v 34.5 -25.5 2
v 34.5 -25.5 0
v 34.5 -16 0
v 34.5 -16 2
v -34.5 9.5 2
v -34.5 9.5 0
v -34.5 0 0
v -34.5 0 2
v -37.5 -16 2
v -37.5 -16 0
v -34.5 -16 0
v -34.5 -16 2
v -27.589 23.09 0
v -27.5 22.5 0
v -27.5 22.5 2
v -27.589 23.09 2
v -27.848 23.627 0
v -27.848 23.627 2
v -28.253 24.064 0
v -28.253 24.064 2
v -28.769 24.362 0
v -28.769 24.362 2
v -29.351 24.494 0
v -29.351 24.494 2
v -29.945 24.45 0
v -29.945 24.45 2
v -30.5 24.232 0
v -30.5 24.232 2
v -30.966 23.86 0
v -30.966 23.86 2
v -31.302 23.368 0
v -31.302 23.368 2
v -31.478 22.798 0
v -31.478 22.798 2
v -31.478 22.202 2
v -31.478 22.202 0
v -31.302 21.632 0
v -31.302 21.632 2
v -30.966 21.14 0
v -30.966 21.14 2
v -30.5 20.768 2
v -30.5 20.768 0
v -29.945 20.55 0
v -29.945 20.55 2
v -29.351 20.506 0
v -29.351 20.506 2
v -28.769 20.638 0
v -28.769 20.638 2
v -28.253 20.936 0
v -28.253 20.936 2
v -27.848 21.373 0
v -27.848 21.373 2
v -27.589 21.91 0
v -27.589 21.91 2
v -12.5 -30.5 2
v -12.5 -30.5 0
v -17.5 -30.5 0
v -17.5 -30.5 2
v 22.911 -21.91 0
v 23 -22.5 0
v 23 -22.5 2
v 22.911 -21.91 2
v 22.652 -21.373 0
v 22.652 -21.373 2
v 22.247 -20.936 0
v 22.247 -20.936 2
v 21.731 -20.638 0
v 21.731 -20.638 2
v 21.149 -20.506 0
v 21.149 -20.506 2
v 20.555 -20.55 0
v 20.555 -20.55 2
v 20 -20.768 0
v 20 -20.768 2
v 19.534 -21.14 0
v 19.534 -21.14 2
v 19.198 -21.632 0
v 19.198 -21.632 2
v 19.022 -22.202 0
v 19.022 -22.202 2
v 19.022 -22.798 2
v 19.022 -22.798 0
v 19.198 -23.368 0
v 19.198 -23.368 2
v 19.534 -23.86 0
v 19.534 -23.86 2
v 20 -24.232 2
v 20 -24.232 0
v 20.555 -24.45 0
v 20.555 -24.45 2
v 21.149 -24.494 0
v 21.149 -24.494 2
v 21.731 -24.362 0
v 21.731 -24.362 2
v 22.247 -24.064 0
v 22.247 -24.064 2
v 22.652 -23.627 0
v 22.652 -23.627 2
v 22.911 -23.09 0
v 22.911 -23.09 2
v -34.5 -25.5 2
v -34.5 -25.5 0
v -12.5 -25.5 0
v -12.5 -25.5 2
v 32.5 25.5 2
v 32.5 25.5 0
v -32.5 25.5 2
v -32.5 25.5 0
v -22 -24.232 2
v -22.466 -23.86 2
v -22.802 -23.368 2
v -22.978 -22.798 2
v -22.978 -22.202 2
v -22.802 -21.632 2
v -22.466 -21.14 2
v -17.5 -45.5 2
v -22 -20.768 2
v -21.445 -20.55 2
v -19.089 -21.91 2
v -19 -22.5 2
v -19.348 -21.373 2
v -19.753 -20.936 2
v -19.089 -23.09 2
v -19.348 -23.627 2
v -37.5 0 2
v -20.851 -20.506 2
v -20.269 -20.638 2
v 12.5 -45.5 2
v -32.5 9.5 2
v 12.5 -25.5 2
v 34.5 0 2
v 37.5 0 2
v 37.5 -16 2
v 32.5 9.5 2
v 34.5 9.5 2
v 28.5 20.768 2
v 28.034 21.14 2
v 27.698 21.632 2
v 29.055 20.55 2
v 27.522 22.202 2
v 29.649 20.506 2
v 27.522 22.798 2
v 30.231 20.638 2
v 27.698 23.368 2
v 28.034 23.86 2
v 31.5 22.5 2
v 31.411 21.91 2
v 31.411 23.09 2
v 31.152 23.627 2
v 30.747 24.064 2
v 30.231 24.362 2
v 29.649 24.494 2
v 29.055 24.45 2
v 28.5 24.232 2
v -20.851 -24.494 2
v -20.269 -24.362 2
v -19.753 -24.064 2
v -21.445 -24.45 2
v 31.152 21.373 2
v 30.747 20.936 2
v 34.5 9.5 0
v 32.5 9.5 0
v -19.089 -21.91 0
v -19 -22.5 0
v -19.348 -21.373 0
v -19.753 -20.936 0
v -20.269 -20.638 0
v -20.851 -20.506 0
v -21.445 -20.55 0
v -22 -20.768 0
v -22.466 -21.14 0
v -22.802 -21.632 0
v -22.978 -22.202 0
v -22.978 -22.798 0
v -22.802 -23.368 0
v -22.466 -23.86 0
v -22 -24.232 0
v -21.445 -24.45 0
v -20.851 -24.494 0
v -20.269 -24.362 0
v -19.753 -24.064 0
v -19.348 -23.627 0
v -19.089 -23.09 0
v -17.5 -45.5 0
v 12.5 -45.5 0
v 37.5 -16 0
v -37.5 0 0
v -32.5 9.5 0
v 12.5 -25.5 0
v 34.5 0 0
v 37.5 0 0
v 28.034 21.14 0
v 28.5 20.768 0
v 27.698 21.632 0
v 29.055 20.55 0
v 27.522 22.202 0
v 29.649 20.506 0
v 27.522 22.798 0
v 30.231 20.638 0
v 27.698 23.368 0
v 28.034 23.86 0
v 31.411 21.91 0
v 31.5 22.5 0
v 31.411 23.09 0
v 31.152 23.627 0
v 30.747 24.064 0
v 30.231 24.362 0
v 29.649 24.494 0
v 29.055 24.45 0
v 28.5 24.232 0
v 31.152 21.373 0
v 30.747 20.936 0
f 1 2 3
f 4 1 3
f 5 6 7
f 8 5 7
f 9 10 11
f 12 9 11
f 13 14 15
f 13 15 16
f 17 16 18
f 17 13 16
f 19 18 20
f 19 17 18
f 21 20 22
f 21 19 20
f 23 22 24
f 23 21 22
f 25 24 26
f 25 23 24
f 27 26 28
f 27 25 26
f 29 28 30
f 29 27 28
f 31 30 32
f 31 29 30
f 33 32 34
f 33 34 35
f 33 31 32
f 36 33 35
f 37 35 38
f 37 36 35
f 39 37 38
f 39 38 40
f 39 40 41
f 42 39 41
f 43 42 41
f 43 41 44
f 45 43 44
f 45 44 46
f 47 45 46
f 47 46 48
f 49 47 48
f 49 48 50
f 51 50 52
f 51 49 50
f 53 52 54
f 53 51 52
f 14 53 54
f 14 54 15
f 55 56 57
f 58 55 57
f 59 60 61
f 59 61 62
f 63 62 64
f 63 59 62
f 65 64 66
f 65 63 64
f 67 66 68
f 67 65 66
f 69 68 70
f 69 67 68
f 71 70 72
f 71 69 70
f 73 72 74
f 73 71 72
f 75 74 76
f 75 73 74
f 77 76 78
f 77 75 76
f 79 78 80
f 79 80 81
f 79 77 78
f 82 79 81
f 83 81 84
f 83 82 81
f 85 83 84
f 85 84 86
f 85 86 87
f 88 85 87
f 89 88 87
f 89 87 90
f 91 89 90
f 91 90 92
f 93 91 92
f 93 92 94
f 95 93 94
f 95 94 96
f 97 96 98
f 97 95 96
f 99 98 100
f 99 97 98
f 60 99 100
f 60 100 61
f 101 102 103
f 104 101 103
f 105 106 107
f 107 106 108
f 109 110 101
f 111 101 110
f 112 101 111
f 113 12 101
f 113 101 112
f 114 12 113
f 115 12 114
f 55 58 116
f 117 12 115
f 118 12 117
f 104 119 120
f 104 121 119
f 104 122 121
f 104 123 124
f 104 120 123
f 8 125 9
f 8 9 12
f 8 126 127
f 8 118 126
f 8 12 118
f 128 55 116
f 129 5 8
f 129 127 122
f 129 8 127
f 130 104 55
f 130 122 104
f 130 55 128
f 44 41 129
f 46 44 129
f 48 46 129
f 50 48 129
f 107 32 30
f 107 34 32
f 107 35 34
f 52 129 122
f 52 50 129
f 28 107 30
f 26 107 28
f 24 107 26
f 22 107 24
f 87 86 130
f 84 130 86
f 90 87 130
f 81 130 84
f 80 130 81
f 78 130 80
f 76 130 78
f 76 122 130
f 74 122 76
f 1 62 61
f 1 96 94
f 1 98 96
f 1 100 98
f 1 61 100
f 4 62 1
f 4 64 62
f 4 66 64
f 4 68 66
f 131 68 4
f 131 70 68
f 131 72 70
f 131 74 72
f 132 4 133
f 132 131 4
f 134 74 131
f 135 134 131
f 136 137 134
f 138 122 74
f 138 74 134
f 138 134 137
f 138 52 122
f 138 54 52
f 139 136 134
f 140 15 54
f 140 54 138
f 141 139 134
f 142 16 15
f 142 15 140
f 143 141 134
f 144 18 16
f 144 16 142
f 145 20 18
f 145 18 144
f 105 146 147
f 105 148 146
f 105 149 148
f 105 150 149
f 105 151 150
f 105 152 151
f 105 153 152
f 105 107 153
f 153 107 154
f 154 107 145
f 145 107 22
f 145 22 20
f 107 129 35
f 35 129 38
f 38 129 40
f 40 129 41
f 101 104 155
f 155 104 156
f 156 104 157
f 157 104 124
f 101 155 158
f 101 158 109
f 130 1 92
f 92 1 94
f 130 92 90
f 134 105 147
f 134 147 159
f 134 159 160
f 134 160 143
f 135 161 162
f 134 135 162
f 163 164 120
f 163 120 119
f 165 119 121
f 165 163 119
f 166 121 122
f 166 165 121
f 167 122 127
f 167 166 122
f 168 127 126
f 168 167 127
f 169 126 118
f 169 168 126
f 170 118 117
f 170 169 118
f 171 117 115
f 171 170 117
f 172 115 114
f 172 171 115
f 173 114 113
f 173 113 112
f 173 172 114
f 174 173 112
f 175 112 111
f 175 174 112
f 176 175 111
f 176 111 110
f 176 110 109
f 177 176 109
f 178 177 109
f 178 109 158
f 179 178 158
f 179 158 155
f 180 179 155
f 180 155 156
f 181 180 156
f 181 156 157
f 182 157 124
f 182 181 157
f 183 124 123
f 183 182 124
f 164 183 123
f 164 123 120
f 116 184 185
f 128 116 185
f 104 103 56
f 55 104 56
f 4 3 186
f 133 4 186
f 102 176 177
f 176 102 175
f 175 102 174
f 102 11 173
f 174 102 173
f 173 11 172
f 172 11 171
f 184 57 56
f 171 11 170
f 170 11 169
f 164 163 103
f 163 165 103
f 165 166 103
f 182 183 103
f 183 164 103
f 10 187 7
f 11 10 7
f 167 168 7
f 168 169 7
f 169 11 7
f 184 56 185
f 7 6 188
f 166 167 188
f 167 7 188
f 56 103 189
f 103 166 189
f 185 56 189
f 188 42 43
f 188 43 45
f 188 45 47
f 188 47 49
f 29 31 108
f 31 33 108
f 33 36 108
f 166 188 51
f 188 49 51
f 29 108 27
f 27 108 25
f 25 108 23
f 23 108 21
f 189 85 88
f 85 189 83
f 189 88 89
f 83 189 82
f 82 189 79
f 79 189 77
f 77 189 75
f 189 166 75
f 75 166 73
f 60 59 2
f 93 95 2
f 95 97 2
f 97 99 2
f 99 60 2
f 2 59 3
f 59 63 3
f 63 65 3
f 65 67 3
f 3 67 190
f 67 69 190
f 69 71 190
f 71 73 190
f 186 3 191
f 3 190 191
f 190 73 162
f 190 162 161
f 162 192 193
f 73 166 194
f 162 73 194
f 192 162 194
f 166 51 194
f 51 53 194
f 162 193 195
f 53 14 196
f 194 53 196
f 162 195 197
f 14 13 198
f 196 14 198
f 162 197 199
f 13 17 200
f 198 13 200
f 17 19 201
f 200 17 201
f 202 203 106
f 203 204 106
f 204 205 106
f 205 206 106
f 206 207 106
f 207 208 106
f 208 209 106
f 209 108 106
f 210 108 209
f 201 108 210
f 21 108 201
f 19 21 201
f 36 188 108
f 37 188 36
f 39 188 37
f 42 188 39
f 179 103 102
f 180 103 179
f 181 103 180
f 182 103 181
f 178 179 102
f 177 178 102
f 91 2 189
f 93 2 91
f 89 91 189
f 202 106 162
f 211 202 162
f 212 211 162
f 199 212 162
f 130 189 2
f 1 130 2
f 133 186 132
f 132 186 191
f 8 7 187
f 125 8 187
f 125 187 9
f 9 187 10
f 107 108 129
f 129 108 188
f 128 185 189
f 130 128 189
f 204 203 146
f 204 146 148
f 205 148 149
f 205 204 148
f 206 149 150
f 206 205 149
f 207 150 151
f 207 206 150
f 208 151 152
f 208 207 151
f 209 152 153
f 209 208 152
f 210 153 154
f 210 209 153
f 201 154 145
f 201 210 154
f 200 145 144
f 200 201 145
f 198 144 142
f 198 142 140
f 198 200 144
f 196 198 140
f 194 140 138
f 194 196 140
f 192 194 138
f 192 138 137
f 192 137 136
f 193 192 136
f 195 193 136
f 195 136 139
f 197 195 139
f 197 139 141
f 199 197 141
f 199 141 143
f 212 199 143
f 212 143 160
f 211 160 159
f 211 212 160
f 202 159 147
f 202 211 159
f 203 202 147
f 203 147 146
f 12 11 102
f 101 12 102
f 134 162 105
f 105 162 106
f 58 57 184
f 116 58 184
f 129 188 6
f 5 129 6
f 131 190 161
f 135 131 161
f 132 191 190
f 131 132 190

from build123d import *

# Parameters (mm, degrees)
F0_R     = 2
F1_DEPTH = 2


with BuildPart() as f1:
    # F0 (on Top) → F1 (new body)
    with BuildSketch(Plane.XY):
        Polygon((32.5, 9.5), (32.5, 25.5), (-32.5, 25.5), (-32.5, 9.5), (-32.5, -25.5), (-12.5, -25.5), (12.5, -25.5), (32.5, -25.5), align=None)
        with Locations((-21, -22.5)):
            Circle(F0_R, mode=Mode.SUBTRACT)
        with Locations((21, -22.5)):
            Circle(F0_R, mode=Mode.SUBTRACT)
        with Locations((-29.5, 22.5)):
            Circle(F0_R, mode=Mode.SUBTRACT)
        with Locations((29.5, 22.5)):
            Circle(F0_R, mode=Mode.SUBTRACT)
        Polygon((34.5, 9.5), (32.5, 9.5), (32.5, -25.5), (34.5, -25.5), (34.5, -16), (37.5, -16), (37.5, 0), (34.5, 0), align=None)
        Polygon((-32.5, -25.5), (-32.5, 9.5), (-34.5, 9.5), (-34.5, 0), (-37.5, 0), (-37.5, -16), (-34.5, -16), (-34.5, -25.5), align=None)
        Polygon((12.5, -45.5), (12.5, -25.5), (-12.5, -25.5), (-12.5, -30.5), (-17.5, -30.5), (-17.5, -45.5), align=None)
    extrude(amount=F1_DEPTH)


solid = f1.part
